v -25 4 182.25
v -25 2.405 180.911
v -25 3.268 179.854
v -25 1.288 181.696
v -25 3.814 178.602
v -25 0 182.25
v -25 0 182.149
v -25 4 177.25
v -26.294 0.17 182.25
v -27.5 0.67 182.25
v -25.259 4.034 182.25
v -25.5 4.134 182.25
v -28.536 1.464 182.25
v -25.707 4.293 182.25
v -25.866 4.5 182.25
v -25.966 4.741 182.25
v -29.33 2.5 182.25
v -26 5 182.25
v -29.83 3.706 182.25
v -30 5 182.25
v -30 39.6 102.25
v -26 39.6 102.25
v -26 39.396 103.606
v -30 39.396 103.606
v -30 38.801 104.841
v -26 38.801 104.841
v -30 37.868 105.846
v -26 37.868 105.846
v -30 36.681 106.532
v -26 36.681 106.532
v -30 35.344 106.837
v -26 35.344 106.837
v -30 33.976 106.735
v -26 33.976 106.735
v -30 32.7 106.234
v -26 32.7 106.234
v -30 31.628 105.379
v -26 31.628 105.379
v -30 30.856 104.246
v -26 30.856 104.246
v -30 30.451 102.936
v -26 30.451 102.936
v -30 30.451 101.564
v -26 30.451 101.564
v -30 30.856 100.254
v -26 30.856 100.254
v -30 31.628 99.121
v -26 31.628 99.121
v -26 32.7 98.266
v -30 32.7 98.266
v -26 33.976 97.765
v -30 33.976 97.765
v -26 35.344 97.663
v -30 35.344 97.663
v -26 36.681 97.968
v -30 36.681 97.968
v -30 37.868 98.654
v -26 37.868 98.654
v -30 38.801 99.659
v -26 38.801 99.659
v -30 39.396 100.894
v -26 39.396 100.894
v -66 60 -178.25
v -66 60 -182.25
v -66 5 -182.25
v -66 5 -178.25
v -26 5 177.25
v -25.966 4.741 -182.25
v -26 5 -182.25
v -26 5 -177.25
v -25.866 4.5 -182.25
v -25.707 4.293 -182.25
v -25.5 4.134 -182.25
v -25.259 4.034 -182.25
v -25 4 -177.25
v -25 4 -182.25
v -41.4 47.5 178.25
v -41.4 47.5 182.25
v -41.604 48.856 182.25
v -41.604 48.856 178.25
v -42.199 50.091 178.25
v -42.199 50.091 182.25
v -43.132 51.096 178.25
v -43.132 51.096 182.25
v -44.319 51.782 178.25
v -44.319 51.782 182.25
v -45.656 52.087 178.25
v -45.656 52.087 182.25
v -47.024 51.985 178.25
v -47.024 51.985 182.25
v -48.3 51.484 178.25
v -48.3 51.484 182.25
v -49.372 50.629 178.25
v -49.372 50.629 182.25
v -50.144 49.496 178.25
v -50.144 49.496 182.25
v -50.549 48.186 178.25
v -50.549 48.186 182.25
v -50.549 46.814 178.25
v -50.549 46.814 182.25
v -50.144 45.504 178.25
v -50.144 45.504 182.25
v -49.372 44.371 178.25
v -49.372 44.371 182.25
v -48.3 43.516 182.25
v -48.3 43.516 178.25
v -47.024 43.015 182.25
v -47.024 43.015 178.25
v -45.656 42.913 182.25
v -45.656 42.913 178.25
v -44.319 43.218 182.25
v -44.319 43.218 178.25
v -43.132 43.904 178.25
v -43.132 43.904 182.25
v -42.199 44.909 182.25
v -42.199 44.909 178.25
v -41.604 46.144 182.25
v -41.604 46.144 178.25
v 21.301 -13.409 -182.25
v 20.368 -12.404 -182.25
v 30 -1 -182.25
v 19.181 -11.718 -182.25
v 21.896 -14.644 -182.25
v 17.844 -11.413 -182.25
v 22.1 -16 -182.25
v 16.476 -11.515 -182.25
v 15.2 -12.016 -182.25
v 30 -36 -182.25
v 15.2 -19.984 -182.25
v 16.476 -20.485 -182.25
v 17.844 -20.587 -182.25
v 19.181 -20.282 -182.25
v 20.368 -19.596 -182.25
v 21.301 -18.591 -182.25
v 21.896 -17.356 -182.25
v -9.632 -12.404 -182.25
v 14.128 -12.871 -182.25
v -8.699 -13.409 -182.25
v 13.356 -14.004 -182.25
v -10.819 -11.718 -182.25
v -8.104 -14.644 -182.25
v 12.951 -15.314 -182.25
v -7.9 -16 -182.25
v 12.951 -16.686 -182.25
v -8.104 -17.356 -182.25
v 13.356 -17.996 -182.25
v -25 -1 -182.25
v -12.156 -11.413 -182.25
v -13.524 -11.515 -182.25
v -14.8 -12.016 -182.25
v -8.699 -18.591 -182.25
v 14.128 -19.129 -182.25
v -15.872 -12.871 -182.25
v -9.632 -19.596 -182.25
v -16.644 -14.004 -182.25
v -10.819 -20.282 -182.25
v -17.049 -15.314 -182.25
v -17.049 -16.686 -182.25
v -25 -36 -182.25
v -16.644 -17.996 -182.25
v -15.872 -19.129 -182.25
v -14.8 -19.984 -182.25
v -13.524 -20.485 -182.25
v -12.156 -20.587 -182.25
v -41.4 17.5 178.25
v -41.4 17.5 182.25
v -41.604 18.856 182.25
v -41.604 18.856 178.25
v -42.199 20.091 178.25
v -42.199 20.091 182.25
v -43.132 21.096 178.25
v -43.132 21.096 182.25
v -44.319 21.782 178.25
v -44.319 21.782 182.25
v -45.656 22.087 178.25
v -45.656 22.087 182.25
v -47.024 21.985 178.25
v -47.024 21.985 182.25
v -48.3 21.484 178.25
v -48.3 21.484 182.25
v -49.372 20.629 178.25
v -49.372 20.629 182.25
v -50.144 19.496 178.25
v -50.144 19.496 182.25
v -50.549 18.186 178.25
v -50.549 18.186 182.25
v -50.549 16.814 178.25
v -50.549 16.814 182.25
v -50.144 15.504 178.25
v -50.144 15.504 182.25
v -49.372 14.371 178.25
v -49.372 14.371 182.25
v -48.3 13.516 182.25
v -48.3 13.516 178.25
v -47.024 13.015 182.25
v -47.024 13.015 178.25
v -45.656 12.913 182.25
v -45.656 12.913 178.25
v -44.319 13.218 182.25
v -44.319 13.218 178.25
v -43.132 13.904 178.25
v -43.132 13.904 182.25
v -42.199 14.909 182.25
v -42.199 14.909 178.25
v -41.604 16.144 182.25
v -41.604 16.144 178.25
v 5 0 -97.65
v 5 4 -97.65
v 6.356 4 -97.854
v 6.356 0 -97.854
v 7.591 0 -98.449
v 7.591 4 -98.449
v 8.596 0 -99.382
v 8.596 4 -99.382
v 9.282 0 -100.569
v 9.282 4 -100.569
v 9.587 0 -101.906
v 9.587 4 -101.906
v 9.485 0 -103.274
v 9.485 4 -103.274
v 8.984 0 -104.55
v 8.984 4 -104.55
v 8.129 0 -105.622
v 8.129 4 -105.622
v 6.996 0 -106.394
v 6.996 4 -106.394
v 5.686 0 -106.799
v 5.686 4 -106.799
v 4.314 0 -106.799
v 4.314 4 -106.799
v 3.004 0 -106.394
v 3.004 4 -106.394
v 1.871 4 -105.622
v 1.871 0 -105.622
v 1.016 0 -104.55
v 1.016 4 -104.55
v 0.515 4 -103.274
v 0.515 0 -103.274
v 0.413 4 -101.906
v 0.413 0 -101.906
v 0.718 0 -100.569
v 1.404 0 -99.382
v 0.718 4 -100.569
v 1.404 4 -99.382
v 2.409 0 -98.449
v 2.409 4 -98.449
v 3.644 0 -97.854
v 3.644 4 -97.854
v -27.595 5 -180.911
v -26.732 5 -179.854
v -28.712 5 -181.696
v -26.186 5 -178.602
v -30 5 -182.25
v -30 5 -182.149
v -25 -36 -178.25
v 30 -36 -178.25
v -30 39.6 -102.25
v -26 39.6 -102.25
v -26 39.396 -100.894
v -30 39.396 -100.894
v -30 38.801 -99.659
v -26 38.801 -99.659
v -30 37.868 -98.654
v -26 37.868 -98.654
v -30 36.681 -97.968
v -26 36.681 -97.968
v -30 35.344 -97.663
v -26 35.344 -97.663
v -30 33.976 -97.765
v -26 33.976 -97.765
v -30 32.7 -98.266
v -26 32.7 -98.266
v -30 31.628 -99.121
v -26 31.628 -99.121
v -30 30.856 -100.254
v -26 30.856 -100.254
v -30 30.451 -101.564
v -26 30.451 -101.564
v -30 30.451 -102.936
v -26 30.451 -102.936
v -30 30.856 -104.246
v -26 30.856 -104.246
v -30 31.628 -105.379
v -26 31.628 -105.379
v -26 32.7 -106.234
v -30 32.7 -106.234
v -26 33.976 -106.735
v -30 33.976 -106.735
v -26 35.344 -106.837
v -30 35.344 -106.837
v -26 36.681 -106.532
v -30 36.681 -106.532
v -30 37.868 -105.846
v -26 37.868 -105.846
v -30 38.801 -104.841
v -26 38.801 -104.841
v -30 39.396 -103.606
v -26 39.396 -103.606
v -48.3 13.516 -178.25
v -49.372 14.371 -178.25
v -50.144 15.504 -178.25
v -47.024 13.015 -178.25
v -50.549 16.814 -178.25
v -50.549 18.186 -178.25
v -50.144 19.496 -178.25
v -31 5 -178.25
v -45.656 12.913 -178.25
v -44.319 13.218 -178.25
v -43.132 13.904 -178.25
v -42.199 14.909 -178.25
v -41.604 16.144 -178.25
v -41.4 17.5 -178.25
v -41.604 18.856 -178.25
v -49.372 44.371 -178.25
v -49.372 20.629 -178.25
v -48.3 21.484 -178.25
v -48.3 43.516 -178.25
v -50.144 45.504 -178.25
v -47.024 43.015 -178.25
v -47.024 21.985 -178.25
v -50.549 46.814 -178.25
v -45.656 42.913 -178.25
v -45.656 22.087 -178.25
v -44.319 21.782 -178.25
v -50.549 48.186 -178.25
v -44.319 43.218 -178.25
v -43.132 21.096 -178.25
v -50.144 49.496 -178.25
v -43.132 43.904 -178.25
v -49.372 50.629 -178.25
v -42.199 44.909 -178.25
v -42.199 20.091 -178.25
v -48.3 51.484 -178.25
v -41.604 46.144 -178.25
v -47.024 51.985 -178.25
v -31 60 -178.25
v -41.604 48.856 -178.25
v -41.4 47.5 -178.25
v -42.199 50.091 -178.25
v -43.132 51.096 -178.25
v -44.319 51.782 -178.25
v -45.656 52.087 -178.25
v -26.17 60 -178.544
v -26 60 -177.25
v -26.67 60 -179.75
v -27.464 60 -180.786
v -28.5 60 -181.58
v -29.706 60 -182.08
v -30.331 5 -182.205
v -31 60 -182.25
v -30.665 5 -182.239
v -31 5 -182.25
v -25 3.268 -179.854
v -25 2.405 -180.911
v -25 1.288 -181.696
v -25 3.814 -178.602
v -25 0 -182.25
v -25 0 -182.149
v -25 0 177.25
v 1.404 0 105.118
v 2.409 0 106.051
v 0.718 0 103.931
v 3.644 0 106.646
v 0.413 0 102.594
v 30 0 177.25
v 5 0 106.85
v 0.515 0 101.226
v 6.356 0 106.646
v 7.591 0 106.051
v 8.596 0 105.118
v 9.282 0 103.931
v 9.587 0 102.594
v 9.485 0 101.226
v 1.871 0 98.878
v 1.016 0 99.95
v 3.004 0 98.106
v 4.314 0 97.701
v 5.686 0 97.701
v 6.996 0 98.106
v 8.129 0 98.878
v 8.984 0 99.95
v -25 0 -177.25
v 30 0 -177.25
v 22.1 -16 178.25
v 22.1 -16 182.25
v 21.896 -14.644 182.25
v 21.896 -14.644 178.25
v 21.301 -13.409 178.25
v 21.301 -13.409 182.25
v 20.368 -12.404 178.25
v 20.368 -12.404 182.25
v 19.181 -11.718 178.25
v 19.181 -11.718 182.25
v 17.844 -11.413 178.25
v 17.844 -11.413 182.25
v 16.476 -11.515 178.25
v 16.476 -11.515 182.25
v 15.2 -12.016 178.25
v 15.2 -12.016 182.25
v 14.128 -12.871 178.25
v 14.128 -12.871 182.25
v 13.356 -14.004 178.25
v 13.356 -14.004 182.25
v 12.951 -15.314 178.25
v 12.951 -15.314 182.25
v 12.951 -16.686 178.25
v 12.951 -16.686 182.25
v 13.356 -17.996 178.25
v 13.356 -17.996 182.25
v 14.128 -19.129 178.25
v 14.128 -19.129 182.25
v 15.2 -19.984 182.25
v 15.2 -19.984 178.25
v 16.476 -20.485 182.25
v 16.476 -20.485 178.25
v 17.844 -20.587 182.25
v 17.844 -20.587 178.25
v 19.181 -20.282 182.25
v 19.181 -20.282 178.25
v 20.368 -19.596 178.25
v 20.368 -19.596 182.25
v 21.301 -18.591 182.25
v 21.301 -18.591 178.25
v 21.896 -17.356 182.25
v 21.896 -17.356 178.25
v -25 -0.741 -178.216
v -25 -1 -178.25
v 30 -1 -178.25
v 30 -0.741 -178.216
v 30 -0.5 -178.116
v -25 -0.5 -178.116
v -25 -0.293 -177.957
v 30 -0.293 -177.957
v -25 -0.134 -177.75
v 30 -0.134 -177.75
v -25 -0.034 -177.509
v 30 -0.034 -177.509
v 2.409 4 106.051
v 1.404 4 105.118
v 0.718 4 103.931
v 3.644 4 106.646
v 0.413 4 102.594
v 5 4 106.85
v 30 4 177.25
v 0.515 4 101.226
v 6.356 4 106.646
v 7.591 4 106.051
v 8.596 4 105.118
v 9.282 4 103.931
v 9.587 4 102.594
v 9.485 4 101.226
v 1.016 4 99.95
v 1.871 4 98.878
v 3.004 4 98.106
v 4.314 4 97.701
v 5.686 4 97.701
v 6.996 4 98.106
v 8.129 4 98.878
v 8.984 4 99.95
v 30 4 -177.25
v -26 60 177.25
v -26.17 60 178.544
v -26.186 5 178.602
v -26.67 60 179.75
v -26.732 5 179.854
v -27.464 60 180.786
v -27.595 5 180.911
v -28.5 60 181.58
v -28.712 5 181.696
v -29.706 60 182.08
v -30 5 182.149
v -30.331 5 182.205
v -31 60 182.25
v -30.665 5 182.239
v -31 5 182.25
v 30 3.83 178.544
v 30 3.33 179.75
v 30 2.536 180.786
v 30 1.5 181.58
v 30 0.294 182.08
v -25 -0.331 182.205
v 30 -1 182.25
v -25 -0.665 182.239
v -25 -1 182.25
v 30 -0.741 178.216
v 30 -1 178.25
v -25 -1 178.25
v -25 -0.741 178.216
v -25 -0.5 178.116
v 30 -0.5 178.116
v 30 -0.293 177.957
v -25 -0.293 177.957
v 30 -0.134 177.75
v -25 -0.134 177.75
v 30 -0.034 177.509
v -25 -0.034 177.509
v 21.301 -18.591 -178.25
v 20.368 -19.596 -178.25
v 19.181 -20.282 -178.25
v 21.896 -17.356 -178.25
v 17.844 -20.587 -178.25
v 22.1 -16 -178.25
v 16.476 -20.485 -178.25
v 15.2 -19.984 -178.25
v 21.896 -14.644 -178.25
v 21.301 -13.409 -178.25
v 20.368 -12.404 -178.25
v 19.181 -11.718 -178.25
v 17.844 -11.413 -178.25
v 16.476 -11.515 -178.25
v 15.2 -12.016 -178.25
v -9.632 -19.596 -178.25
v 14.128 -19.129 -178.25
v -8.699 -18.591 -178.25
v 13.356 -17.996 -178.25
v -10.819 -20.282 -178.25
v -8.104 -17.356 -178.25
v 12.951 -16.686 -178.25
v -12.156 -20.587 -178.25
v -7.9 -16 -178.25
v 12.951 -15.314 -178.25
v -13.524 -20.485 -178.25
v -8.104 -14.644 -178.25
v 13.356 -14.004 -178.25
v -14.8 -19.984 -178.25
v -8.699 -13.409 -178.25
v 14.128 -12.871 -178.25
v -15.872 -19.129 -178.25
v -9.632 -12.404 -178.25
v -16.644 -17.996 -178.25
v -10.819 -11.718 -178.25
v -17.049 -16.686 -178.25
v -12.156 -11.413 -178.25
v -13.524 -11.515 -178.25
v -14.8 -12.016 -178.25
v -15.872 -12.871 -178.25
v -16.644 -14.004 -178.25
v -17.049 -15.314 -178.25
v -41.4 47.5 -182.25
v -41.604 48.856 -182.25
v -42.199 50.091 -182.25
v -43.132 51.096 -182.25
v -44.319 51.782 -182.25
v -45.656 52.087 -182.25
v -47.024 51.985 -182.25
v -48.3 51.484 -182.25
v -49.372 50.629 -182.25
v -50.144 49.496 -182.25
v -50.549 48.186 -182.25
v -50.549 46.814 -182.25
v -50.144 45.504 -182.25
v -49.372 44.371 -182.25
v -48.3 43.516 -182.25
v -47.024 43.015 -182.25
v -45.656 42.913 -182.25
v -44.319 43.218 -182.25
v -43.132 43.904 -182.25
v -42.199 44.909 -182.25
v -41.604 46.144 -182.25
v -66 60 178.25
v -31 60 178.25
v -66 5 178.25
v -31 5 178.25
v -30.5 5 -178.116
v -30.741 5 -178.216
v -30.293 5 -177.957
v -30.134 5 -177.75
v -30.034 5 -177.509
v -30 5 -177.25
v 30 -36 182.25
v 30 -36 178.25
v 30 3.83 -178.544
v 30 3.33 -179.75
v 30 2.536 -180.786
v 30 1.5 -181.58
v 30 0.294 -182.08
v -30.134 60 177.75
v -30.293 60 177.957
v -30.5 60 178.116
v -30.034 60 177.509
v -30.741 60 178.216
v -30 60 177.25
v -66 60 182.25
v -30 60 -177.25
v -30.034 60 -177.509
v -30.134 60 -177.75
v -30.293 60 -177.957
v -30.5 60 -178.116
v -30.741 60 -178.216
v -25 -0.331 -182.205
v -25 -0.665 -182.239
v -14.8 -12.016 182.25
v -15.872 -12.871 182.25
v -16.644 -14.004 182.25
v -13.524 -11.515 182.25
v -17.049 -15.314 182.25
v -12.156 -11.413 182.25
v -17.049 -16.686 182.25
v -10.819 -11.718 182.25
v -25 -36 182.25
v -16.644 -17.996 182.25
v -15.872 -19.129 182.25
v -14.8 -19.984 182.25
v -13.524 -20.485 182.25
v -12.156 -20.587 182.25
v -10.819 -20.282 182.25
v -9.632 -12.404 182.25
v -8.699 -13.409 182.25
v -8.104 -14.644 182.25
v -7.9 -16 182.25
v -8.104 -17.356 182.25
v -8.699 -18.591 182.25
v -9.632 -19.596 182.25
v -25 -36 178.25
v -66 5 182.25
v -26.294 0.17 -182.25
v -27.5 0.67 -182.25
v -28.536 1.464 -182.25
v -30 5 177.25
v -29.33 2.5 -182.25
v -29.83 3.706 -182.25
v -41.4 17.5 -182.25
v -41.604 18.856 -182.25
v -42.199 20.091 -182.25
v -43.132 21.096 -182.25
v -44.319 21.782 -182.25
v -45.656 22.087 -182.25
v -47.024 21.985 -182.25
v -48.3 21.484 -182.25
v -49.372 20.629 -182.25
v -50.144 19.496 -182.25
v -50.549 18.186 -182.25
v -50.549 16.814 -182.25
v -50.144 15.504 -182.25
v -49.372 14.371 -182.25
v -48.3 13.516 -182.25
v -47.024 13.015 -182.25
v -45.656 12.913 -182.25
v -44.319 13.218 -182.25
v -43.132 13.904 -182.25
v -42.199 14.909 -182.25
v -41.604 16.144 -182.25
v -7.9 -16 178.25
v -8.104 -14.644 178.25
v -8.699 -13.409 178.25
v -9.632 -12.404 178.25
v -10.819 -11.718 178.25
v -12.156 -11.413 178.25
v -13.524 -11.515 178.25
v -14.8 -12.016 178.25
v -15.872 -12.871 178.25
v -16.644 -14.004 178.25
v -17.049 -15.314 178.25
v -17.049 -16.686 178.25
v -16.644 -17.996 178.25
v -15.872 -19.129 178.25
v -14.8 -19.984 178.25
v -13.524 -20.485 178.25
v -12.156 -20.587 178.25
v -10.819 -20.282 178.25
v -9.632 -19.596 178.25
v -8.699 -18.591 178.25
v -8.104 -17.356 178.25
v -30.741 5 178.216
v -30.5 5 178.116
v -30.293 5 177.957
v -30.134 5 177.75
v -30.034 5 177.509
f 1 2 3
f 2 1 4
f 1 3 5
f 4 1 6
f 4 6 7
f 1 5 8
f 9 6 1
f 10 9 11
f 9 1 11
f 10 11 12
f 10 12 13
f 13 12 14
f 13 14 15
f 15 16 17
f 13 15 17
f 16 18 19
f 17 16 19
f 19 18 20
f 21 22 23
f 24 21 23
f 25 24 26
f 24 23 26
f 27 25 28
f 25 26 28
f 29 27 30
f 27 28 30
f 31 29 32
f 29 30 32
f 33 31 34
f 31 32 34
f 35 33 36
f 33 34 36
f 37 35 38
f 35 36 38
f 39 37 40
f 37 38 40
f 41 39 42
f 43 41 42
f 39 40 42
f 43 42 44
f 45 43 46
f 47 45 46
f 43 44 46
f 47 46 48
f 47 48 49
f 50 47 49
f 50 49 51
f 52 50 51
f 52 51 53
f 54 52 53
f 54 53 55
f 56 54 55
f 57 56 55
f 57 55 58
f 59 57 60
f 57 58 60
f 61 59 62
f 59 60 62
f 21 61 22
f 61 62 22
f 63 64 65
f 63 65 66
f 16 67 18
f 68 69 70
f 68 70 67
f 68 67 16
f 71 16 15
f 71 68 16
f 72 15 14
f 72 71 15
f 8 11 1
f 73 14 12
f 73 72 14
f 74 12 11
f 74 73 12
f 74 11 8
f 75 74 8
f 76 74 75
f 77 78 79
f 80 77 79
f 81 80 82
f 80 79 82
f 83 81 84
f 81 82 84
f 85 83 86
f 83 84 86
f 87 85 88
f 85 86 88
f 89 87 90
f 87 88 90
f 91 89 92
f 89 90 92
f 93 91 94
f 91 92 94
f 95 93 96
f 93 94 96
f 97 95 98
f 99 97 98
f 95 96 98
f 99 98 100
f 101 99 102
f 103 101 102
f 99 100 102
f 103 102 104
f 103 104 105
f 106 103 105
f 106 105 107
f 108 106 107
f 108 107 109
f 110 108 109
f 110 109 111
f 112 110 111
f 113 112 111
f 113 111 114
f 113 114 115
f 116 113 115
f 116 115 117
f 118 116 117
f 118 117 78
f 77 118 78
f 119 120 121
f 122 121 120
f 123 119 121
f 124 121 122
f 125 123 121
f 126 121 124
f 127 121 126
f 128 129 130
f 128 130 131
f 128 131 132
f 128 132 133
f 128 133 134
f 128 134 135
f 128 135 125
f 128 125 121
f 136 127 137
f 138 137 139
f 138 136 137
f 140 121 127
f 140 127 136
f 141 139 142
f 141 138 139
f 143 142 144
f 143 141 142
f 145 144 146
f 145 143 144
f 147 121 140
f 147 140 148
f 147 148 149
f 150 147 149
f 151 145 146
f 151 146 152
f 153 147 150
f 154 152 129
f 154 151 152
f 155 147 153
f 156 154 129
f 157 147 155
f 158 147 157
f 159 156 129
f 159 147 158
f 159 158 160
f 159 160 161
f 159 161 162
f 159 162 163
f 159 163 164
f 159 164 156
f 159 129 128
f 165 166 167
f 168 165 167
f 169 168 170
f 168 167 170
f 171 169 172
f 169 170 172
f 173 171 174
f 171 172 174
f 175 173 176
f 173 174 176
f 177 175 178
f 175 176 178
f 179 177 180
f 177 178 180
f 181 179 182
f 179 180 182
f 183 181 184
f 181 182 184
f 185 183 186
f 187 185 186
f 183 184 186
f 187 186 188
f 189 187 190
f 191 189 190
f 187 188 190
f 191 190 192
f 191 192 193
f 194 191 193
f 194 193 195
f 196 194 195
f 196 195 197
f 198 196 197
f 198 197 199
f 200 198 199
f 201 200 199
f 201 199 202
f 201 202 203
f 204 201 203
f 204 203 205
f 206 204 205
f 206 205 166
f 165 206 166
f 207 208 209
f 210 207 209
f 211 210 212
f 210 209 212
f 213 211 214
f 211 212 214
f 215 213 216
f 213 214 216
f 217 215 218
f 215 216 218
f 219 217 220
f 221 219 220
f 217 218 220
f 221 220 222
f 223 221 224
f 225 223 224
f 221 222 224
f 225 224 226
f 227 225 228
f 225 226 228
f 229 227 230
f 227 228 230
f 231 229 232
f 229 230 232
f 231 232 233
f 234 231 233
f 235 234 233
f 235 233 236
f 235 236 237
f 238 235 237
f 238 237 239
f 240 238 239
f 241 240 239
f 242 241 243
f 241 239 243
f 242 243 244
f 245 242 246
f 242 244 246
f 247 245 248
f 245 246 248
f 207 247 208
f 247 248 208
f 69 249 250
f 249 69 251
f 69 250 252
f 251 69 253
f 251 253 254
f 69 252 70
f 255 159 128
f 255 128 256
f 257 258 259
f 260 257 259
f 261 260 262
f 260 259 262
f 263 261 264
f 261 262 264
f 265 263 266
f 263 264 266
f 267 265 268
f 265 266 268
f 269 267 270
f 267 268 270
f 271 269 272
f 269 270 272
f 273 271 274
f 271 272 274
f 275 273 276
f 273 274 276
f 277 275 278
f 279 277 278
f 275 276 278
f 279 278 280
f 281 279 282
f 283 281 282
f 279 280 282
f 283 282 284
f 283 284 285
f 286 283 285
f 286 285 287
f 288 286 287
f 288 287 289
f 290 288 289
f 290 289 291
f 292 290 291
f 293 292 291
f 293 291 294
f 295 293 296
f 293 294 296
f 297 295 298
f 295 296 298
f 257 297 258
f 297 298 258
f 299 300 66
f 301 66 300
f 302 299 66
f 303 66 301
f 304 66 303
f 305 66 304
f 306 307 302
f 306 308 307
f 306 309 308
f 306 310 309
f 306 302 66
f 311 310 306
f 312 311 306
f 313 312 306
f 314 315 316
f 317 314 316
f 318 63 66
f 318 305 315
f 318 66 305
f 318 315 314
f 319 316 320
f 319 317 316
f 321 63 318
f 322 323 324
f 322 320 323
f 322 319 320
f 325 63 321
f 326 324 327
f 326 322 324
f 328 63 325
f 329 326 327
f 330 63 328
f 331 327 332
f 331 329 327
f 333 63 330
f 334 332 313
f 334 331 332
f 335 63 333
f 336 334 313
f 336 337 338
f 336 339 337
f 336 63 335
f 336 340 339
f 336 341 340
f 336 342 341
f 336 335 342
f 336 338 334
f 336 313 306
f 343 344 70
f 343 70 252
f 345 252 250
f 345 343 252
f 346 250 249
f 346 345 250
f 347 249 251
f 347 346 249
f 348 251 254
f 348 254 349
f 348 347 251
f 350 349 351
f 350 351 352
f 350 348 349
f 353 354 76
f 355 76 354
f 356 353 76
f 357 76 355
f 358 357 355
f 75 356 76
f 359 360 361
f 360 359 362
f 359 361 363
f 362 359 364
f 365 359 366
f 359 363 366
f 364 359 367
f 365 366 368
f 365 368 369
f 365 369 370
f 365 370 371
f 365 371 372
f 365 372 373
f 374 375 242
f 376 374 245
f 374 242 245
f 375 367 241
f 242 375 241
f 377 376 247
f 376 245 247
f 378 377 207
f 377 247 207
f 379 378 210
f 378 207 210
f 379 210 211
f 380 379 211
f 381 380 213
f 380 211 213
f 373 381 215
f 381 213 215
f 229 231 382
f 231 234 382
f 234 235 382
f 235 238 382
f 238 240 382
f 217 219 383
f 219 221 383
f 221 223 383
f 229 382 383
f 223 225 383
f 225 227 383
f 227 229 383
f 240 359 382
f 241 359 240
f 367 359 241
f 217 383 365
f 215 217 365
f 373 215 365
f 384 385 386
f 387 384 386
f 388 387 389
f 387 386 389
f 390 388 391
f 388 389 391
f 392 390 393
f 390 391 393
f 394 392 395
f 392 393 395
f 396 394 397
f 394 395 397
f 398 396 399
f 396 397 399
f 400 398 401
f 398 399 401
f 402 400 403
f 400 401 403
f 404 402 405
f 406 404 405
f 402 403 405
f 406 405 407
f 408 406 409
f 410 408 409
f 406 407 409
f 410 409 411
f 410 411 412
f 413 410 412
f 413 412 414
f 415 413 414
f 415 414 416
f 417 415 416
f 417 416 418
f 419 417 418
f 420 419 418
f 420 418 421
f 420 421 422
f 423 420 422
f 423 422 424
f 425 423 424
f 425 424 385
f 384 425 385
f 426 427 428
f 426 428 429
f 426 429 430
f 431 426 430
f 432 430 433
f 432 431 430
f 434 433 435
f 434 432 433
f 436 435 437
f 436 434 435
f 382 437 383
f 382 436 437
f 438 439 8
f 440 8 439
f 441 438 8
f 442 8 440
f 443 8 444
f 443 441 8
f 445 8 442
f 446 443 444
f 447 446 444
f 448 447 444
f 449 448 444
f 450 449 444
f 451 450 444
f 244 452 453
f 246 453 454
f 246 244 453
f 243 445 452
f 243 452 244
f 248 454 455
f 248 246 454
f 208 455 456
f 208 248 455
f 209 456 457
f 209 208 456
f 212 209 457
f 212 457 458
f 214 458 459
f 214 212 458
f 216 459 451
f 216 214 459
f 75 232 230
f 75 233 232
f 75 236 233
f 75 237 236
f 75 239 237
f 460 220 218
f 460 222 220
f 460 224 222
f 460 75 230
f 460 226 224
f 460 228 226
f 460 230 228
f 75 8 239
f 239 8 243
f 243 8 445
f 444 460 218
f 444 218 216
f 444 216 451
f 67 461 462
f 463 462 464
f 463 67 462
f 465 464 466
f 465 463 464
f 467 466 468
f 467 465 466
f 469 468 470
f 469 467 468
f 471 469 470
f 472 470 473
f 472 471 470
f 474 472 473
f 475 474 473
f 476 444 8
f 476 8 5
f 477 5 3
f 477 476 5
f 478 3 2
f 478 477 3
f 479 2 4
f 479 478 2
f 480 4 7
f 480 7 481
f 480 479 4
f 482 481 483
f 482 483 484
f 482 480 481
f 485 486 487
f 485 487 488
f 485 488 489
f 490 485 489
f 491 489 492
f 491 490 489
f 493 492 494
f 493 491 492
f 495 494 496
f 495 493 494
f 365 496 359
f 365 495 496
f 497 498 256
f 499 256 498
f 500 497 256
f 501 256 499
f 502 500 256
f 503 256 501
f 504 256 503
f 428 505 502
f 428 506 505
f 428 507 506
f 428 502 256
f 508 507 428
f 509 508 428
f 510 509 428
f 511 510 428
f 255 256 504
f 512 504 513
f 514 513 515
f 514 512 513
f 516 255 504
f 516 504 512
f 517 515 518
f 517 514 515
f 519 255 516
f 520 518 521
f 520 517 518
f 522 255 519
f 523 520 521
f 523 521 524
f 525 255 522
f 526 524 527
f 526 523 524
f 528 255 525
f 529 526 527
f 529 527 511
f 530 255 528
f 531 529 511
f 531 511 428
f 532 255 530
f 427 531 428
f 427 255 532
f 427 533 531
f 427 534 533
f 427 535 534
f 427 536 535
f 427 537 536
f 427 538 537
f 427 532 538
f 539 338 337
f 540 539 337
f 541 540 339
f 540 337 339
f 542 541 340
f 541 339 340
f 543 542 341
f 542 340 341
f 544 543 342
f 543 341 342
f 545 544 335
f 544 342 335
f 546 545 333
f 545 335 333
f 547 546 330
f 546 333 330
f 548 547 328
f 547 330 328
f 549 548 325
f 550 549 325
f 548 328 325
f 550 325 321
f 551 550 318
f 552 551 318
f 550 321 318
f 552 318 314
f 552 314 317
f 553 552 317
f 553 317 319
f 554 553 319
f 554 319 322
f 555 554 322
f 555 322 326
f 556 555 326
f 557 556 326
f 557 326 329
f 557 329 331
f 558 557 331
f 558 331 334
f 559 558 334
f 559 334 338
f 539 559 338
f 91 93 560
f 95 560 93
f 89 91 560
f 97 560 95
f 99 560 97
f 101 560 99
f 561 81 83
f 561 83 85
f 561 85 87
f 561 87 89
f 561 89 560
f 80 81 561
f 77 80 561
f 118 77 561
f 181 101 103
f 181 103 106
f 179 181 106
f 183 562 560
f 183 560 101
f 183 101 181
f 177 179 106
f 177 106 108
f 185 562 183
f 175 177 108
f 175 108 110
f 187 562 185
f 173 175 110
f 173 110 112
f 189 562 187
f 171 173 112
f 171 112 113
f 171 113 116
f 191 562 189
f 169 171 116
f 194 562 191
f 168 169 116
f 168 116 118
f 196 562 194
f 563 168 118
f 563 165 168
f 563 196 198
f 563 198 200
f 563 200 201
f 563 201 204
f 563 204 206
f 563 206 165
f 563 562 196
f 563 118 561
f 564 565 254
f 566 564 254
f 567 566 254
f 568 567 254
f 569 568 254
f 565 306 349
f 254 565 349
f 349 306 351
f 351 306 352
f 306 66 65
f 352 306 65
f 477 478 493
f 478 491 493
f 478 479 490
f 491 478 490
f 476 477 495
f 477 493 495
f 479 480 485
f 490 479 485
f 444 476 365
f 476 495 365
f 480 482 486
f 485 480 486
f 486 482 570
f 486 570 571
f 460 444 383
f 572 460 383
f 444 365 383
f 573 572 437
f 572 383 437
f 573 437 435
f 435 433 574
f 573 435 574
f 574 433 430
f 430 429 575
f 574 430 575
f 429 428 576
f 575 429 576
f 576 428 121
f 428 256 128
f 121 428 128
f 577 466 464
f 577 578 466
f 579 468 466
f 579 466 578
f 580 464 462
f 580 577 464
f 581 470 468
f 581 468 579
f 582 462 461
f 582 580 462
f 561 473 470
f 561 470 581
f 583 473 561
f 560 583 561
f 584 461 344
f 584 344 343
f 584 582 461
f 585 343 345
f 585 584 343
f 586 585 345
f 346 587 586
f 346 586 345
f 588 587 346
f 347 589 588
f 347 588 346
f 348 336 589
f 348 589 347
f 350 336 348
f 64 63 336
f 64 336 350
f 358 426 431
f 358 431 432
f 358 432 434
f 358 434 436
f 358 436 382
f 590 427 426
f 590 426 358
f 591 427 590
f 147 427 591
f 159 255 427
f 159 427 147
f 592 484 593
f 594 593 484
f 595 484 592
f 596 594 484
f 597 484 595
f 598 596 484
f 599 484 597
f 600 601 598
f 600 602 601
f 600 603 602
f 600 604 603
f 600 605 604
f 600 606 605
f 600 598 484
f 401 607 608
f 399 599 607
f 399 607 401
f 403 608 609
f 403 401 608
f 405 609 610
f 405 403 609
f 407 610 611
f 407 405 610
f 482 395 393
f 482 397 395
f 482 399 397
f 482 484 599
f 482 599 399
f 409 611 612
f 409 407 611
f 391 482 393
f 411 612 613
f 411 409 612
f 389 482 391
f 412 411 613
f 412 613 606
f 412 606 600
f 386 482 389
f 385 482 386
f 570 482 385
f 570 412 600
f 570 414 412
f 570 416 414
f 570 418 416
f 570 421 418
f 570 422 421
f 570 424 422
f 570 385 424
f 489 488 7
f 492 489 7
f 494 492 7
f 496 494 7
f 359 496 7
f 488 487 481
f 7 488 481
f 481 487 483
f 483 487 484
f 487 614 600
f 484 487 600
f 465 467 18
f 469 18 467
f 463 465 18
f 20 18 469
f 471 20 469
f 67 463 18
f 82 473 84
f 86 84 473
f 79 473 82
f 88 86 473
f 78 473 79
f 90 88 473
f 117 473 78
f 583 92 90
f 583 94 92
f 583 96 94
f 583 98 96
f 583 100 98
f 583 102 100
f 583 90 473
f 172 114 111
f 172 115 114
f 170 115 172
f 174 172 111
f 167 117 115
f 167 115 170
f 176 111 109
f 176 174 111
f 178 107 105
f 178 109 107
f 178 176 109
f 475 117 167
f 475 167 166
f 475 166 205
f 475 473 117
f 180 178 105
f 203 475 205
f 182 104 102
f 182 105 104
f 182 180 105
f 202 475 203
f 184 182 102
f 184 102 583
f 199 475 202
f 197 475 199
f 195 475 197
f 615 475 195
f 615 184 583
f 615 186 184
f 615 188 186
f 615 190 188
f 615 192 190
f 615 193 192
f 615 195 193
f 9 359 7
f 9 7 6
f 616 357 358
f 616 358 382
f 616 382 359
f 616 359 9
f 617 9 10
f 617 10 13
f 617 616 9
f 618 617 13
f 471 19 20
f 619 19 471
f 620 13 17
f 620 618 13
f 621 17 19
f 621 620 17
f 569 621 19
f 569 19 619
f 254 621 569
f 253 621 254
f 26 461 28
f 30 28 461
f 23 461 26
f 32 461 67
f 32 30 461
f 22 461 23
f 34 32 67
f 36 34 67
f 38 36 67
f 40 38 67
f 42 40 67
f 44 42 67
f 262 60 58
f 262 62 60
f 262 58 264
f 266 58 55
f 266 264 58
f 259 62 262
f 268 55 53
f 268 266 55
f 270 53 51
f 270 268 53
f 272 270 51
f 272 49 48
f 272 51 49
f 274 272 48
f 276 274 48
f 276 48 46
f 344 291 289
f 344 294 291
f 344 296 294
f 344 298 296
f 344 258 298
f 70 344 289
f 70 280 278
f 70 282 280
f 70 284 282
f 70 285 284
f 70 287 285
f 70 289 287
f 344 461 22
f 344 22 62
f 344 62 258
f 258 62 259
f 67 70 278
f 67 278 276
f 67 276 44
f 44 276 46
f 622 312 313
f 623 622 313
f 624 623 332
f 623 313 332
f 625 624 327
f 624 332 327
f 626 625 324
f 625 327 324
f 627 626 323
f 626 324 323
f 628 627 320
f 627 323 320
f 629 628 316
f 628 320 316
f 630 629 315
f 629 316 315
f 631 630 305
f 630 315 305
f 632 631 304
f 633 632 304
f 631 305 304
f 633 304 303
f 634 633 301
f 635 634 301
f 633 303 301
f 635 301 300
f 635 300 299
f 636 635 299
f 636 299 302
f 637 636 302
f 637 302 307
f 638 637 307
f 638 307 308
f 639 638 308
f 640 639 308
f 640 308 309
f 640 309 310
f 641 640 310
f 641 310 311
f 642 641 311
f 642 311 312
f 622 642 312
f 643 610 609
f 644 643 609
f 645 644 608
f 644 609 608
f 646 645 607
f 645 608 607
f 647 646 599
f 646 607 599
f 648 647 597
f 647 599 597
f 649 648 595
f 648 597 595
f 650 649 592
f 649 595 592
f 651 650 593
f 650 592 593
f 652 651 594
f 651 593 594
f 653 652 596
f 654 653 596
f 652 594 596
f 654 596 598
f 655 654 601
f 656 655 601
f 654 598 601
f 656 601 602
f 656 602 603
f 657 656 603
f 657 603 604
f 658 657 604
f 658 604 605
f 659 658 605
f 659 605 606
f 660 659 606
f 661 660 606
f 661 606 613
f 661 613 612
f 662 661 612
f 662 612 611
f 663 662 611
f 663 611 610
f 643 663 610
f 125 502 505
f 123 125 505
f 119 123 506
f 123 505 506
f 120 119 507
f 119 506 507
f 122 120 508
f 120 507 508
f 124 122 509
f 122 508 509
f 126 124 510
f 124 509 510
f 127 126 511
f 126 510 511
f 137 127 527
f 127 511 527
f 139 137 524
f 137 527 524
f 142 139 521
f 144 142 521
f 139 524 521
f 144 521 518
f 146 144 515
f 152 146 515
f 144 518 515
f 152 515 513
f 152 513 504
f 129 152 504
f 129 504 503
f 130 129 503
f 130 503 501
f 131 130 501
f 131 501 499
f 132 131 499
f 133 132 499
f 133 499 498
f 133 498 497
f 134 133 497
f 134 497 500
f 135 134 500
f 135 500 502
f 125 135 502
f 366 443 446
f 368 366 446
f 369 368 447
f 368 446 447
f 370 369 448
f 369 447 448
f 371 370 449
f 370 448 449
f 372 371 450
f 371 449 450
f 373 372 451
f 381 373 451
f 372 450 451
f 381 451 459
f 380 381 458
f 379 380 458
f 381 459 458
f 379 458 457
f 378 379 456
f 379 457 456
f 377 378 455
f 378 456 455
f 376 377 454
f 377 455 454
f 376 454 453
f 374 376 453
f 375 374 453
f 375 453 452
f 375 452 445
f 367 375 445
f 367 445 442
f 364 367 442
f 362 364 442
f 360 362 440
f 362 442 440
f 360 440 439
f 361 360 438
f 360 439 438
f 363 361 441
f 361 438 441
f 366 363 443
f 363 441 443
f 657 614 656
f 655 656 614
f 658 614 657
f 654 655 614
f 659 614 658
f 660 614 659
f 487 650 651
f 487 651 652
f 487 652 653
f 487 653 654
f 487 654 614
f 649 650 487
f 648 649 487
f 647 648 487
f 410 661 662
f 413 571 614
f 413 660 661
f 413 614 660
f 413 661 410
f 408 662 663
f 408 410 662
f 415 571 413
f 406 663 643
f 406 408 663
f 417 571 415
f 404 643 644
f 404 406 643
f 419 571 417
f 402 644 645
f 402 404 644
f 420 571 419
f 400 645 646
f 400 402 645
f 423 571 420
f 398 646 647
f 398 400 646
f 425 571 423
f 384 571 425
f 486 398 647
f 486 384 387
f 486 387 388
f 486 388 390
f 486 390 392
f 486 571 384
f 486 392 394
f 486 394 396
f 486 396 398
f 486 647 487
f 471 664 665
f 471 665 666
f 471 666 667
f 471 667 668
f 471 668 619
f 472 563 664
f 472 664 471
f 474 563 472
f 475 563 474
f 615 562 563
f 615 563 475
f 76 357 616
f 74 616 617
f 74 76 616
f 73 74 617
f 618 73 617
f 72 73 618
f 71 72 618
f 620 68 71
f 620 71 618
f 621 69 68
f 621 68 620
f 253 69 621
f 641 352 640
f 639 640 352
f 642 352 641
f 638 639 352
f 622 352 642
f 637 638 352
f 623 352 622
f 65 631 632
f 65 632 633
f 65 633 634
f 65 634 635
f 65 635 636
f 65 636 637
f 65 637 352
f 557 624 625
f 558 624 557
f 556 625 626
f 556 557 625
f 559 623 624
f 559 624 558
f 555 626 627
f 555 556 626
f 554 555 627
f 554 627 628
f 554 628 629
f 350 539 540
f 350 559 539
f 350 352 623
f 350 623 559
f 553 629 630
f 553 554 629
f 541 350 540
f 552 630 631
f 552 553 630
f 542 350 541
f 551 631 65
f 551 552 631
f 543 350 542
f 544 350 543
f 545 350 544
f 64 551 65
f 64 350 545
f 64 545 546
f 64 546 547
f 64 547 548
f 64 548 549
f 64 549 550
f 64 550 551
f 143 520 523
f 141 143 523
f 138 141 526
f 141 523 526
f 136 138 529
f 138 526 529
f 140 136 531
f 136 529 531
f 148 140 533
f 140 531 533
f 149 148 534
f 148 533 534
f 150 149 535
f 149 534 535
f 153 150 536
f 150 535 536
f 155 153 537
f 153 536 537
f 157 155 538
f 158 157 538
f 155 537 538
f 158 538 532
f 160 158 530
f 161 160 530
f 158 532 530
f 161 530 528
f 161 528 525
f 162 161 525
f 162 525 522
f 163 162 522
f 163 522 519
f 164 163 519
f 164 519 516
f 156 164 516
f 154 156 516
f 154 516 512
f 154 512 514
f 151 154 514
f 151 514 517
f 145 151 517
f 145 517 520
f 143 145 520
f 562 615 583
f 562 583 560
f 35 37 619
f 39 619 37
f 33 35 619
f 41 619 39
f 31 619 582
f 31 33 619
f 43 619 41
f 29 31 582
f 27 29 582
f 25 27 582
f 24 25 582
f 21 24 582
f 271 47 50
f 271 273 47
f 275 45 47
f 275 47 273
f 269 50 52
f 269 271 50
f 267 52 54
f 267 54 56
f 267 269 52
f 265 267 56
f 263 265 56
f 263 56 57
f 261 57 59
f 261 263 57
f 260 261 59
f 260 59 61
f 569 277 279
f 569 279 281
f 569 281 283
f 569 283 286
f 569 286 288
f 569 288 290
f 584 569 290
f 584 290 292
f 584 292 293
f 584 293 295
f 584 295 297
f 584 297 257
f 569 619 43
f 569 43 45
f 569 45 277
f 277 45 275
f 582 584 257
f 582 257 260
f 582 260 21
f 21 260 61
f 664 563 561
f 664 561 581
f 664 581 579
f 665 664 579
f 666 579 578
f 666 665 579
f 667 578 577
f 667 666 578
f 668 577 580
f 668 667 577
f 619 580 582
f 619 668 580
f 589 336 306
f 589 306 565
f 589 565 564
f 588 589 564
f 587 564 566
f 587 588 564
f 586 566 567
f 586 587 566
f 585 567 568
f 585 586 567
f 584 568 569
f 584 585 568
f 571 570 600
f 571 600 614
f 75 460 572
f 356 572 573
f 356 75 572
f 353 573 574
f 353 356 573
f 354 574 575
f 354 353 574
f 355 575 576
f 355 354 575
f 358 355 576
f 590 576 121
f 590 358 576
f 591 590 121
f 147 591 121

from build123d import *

# Parameters (mm, degrees)
SKETCH1_W                      = 60
SKETCH1_H                      = 364.5
BASE_FLANGE1_DEPTH             = 4
EDGE_FLANGE1_STRIP_W           = 18
EDGE_FLANGE1_STRIP_H           = 4
EDGE_FLANGE1_STRIP_CUT_DEPTH   = 364.5
EDGE_FLANGE1_DEPTH             = 364.5
EDGE_FLANGE2_STRIP_W           = 18
EDGE_FLANGE2_STRIP_H           = 4
EDGE_FLANGE2_STRIP_CUT_DEPTH   = 55
EDGE_FLANGE2_STRIP_2_W         = 18
EDGE_FLANGE2_STRIP_2_H         = 4
EDGE_FLANGE2_STRIP_CUT_2_DEPTH = 55
EDGE_FLANGE2_STRIP_3_W         = 18
EDGE_FLANGE2_STRIP_3_H         = 4
EDGE_FLANGE2_STRIP_CUT_3_DEPTH = 55
EDGE_FLANGE2_STRIP_4_W         = 18
EDGE_FLANGE2_STRIP_4_H         = 4
EDGE_FLANGE2_STRIP_CUT_4_DEPTH = 55
EDGE_FLANGE2_DEPTH             = 55
EDGE_FLANGE2_BEND_DEPTH        = 55
EDGE_FLANGE2_BEND_2_DEPTH      = 55
EDGE_FLANGE2_BEND_3_DEPTH      = 55
SKETCH18_R                     = 4.6
EXTRUDE1_DEPTH                 = 376.254913359
SKETCH19_R                     = 4.6
EXTRUDE2_DEPTH                 = 4
SKETCH20_R                     = 4.6
EXTRUDE3_DEPTH                 = 4


# Sheet-metal steps are written as plain solids
with BuildPart() as part:
    # Sketch1 → Base-Flange1 (new body)
    with BuildSketch(Plane(origin=(0, 0, 0), x_dir=(1, 0, 0), z_dir=(0, 1, 0))):
        Rectangle(SKETCH1_W, SKETCH1_H)
    extrude(amount=BASE_FLANGE1_DEPTH)

    # Edge-Flange1 strip (across the edge) → Edge-Flange1 strip cut (cut)
    with BuildSketch(Plane(origin=(-30, 4, -182.25), x_dir=(1, 0, 0), z_dir=(0, 0, 1))):
        with Locations((-4, -2)):
            Rectangle(EDGE_FLANGE1_STRIP_W, EDGE_FLANGE1_STRIP_H)
    extrude(amount=EDGE_FLANGE1_STRIP_CUT_DEPTH, mode=Mode.SUBTRACT)

    # Edge-Flange1 section (across the edge) → Edge-Flange1 (add)
    with BuildSketch(Plane(origin=(-30, 4, -182.25), x_dir=(1, 0, 0), z_dir=(0, 0, 1))):
        with BuildLine():
            Line((0, 1), (0, 56))
            Line((0, 56), (4, 56))
            Line((4, 56), (4, 1))
            ThreePointArc((4, 1), (4.292893219, 0.292893219), (5, 0))
            Line((5, 0), (5, -4))
            ThreePointArc((5, -4), (1.464466094, -2.535533906), (0, 1))
        make_face()
    extrude(amount=EDGE_FLANGE1_DEPTH)

    # Edge-Flange2 strip (across the edge) → Edge-Flange2 strip cut (cut)
    with BuildSketch(Plane(origin=(-30, 5, 182.25), x_dir=(0, 0, -1), z_dir=(0, 1, 0))):
        with Locations((-4, -2)):
            Rectangle(EDGE_FLANGE2_STRIP_W, EDGE_FLANGE2_STRIP_H)
    extrude(amount=EDGE_FLANGE2_STRIP_CUT_DEPTH, mode=Mode.SUBTRACT)

    # Edge-Flange2 strip 2 (across the edge) → Edge-Flange2 strip cut 2 (cut)
    with BuildSketch(Plane(origin=(30, 0, 182.25), x_dir=(0, 0, -1), z_dir=(-1, 0, 0))):
        with Locations((-4, -2)):
            Rectangle(EDGE_FLANGE2_STRIP_2_W, EDGE_FLANGE2_STRIP_2_H)
    extrude(amount=EDGE_FLANGE2_STRIP_CUT_2_DEPTH, mode=Mode.SUBTRACT)

    # Edge-Flange2 strip 3 (across the edge) → Edge-Flange2 strip cut 3 (cut)
    with BuildSketch(Plane(origin=(-30, 60, -182.25), x_dir=(0, 0, 1), z_dir=(0, -1, 0))):
        with Locations((-4, -2)):
            Rectangle(EDGE_FLANGE2_STRIP_3_W, EDGE_FLANGE2_STRIP_3_H)
    extrude(amount=EDGE_FLANGE2_STRIP_CUT_3_DEPTH, mode=Mode.SUBTRACT)

    # Edge-Flange2 strip 4 (across the edge) → Edge-Flange2 strip cut 4 (cut)
    with BuildSketch(Plane(origin=(-25, 0, -182.25), x_dir=(0, 0, 1), z_dir=(1, 0, 0))):
        with Locations((-4, -2)):
            Rectangle(EDGE_FLANGE2_STRIP_4_W, EDGE_FLANGE2_STRIP_4_H)
    extrude(amount=EDGE_FLANGE2_STRIP_CUT_4_DEPTH, mode=Mode.SUBTRACT)

    # Edge-Flange2 section (across the edge) → Edge-Flange2 (add)
    with BuildSketch(Plane(origin=(-30, 5, 182.25), x_dir=(0, 0, -1), z_dir=(0, 1, 0))):
        with BuildLine():
            Line((0, 1), (0, 36))
            Line((0, 36), (4, 36))
            Line((4, 36), (4, 1))
            ThreePointArc((4, 1), (4.292893219, 0.292893219), (5, 0))
            Line((5, 0), (5, -4))
            ThreePointArc((5, -4), (1.464466094, -2.535533906), (0, 1))
        make_face()
    extrude(amount=EDGE_FLANGE2_DEPTH)

    # Edge-Flange2 section 2 (across the edge) → Edge-Flange2 bend (add)
    with BuildSketch(Plane(origin=(30, 0, 182.25), x_dir=(0, 0, -1), z_dir=(-1, 0, 0))):
        with BuildLine():
            Line((0, 1), (0, 36))
            Line((0, 36), (4, 36))
            Line((4, 36), (4, 1))
            ThreePointArc((4, 1), (4.292893219, 0.292893219), (5, 0))
            Line((5, 0), (5, -4))
            ThreePointArc((5, -4), (1.464466094, -2.535533906), (0, 1))
        make_face()
    extrude(amount=EDGE_FLANGE2_BEND_DEPTH)

    # Edge-Flange2 section 3 (across the edge) → Edge-Flange2 bend 2 (add)
    with BuildSketch(Plane(origin=(-30, 60, -182.25), x_dir=(0, 0, 1), z_dir=(0, -1, 0))):
        with BuildLine():
            Line((0, 1), (0, 36))
            Line((0, 36), (4, 36))
            Line((4, 36), (4, 1))
            ThreePointArc((4, 1), (4.292893219, 0.292893219), (5, 0))
            Line((5, 0), (5, -4))
            ThreePointArc((5, -4), (1.464466094, -2.535533906), (0, 1))
        make_face()
    extrude(amount=EDGE_FLANGE2_BEND_2_DEPTH)

    # Edge-Flange2 section 4 (across the edge) → Edge-Flange2 bend 3 (add)
    with BuildSketch(Plane(origin=(-25, 0, -182.25), x_dir=(0, 0, 1), z_dir=(1, 0, 0))):
        with BuildLine():
            Line((0, 1), (0, 36))
            Line((0, 36), (4, 36))
            Line((4, 36), (4, 1))
            ThreePointArc((4, 1), (4.292893219, 0.292893219), (5, 0))
            Line((5, 0), (5, -4))
            ThreePointArc((5, -4), (1.464466094, -2.535533906), (0, 1))
        make_face()
    extrude(amount=EDGE_FLANGE2_BEND_3_DEPTH)

    # Sketch18 → Extrude1 (cut, through all)
    with BuildSketch(Plane.XY.offset(182.25)):
        with Locations((-46, 47.5)):
            Circle(SKETCH18_R)
        with Locations((-46, 17.5)):
            Circle(SKETCH18_R)
        with Locations((-12.5, -16)):
            Circle(SKETCH18_R)
        with Locations((17.5, -16)):
            Circle(SKETCH18_R)
    extrude(amount=-EXTRUDE1_DEPTH, mode=Mode.SUBTRACT)

    # Sketch19 → Extrude2 (cut)
    with BuildSketch(Plane(origin=(-26, 0, 0), x_dir=(0, 0, -1), z_dir=(1, 0, 0))):
        with Locations(Location((-102.25, 35, 0), (0, 0, 90))):
            Circle(SKETCH19_R)
        with Locations(Location((102.25, 35, 0), (0, 0, 90))):
            Circle(SKETCH19_R)
    extrude(amount=-EXTRUDE2_DEPTH, mode=Mode.SUBTRACT)

    # Sketch20 → Extrude3 (cut)
    with BuildSketch(Plane(origin=(0, 4, 0), x_dir=(1, 0, 0), z_dir=(0, 1, 0))):
        with Locations(Location((5, 102.25, 0), (0, 0, 270))):
            Circle(SKETCH20_R)
        with Locations(Location((5, -102.25, 0), (0, 0, 270))):
            Circle(SKETCH20_R)
    extrude(amount=-EXTRUDE3_DEPTH, mode=Mode.SUBTRACT)


solid = part.part
